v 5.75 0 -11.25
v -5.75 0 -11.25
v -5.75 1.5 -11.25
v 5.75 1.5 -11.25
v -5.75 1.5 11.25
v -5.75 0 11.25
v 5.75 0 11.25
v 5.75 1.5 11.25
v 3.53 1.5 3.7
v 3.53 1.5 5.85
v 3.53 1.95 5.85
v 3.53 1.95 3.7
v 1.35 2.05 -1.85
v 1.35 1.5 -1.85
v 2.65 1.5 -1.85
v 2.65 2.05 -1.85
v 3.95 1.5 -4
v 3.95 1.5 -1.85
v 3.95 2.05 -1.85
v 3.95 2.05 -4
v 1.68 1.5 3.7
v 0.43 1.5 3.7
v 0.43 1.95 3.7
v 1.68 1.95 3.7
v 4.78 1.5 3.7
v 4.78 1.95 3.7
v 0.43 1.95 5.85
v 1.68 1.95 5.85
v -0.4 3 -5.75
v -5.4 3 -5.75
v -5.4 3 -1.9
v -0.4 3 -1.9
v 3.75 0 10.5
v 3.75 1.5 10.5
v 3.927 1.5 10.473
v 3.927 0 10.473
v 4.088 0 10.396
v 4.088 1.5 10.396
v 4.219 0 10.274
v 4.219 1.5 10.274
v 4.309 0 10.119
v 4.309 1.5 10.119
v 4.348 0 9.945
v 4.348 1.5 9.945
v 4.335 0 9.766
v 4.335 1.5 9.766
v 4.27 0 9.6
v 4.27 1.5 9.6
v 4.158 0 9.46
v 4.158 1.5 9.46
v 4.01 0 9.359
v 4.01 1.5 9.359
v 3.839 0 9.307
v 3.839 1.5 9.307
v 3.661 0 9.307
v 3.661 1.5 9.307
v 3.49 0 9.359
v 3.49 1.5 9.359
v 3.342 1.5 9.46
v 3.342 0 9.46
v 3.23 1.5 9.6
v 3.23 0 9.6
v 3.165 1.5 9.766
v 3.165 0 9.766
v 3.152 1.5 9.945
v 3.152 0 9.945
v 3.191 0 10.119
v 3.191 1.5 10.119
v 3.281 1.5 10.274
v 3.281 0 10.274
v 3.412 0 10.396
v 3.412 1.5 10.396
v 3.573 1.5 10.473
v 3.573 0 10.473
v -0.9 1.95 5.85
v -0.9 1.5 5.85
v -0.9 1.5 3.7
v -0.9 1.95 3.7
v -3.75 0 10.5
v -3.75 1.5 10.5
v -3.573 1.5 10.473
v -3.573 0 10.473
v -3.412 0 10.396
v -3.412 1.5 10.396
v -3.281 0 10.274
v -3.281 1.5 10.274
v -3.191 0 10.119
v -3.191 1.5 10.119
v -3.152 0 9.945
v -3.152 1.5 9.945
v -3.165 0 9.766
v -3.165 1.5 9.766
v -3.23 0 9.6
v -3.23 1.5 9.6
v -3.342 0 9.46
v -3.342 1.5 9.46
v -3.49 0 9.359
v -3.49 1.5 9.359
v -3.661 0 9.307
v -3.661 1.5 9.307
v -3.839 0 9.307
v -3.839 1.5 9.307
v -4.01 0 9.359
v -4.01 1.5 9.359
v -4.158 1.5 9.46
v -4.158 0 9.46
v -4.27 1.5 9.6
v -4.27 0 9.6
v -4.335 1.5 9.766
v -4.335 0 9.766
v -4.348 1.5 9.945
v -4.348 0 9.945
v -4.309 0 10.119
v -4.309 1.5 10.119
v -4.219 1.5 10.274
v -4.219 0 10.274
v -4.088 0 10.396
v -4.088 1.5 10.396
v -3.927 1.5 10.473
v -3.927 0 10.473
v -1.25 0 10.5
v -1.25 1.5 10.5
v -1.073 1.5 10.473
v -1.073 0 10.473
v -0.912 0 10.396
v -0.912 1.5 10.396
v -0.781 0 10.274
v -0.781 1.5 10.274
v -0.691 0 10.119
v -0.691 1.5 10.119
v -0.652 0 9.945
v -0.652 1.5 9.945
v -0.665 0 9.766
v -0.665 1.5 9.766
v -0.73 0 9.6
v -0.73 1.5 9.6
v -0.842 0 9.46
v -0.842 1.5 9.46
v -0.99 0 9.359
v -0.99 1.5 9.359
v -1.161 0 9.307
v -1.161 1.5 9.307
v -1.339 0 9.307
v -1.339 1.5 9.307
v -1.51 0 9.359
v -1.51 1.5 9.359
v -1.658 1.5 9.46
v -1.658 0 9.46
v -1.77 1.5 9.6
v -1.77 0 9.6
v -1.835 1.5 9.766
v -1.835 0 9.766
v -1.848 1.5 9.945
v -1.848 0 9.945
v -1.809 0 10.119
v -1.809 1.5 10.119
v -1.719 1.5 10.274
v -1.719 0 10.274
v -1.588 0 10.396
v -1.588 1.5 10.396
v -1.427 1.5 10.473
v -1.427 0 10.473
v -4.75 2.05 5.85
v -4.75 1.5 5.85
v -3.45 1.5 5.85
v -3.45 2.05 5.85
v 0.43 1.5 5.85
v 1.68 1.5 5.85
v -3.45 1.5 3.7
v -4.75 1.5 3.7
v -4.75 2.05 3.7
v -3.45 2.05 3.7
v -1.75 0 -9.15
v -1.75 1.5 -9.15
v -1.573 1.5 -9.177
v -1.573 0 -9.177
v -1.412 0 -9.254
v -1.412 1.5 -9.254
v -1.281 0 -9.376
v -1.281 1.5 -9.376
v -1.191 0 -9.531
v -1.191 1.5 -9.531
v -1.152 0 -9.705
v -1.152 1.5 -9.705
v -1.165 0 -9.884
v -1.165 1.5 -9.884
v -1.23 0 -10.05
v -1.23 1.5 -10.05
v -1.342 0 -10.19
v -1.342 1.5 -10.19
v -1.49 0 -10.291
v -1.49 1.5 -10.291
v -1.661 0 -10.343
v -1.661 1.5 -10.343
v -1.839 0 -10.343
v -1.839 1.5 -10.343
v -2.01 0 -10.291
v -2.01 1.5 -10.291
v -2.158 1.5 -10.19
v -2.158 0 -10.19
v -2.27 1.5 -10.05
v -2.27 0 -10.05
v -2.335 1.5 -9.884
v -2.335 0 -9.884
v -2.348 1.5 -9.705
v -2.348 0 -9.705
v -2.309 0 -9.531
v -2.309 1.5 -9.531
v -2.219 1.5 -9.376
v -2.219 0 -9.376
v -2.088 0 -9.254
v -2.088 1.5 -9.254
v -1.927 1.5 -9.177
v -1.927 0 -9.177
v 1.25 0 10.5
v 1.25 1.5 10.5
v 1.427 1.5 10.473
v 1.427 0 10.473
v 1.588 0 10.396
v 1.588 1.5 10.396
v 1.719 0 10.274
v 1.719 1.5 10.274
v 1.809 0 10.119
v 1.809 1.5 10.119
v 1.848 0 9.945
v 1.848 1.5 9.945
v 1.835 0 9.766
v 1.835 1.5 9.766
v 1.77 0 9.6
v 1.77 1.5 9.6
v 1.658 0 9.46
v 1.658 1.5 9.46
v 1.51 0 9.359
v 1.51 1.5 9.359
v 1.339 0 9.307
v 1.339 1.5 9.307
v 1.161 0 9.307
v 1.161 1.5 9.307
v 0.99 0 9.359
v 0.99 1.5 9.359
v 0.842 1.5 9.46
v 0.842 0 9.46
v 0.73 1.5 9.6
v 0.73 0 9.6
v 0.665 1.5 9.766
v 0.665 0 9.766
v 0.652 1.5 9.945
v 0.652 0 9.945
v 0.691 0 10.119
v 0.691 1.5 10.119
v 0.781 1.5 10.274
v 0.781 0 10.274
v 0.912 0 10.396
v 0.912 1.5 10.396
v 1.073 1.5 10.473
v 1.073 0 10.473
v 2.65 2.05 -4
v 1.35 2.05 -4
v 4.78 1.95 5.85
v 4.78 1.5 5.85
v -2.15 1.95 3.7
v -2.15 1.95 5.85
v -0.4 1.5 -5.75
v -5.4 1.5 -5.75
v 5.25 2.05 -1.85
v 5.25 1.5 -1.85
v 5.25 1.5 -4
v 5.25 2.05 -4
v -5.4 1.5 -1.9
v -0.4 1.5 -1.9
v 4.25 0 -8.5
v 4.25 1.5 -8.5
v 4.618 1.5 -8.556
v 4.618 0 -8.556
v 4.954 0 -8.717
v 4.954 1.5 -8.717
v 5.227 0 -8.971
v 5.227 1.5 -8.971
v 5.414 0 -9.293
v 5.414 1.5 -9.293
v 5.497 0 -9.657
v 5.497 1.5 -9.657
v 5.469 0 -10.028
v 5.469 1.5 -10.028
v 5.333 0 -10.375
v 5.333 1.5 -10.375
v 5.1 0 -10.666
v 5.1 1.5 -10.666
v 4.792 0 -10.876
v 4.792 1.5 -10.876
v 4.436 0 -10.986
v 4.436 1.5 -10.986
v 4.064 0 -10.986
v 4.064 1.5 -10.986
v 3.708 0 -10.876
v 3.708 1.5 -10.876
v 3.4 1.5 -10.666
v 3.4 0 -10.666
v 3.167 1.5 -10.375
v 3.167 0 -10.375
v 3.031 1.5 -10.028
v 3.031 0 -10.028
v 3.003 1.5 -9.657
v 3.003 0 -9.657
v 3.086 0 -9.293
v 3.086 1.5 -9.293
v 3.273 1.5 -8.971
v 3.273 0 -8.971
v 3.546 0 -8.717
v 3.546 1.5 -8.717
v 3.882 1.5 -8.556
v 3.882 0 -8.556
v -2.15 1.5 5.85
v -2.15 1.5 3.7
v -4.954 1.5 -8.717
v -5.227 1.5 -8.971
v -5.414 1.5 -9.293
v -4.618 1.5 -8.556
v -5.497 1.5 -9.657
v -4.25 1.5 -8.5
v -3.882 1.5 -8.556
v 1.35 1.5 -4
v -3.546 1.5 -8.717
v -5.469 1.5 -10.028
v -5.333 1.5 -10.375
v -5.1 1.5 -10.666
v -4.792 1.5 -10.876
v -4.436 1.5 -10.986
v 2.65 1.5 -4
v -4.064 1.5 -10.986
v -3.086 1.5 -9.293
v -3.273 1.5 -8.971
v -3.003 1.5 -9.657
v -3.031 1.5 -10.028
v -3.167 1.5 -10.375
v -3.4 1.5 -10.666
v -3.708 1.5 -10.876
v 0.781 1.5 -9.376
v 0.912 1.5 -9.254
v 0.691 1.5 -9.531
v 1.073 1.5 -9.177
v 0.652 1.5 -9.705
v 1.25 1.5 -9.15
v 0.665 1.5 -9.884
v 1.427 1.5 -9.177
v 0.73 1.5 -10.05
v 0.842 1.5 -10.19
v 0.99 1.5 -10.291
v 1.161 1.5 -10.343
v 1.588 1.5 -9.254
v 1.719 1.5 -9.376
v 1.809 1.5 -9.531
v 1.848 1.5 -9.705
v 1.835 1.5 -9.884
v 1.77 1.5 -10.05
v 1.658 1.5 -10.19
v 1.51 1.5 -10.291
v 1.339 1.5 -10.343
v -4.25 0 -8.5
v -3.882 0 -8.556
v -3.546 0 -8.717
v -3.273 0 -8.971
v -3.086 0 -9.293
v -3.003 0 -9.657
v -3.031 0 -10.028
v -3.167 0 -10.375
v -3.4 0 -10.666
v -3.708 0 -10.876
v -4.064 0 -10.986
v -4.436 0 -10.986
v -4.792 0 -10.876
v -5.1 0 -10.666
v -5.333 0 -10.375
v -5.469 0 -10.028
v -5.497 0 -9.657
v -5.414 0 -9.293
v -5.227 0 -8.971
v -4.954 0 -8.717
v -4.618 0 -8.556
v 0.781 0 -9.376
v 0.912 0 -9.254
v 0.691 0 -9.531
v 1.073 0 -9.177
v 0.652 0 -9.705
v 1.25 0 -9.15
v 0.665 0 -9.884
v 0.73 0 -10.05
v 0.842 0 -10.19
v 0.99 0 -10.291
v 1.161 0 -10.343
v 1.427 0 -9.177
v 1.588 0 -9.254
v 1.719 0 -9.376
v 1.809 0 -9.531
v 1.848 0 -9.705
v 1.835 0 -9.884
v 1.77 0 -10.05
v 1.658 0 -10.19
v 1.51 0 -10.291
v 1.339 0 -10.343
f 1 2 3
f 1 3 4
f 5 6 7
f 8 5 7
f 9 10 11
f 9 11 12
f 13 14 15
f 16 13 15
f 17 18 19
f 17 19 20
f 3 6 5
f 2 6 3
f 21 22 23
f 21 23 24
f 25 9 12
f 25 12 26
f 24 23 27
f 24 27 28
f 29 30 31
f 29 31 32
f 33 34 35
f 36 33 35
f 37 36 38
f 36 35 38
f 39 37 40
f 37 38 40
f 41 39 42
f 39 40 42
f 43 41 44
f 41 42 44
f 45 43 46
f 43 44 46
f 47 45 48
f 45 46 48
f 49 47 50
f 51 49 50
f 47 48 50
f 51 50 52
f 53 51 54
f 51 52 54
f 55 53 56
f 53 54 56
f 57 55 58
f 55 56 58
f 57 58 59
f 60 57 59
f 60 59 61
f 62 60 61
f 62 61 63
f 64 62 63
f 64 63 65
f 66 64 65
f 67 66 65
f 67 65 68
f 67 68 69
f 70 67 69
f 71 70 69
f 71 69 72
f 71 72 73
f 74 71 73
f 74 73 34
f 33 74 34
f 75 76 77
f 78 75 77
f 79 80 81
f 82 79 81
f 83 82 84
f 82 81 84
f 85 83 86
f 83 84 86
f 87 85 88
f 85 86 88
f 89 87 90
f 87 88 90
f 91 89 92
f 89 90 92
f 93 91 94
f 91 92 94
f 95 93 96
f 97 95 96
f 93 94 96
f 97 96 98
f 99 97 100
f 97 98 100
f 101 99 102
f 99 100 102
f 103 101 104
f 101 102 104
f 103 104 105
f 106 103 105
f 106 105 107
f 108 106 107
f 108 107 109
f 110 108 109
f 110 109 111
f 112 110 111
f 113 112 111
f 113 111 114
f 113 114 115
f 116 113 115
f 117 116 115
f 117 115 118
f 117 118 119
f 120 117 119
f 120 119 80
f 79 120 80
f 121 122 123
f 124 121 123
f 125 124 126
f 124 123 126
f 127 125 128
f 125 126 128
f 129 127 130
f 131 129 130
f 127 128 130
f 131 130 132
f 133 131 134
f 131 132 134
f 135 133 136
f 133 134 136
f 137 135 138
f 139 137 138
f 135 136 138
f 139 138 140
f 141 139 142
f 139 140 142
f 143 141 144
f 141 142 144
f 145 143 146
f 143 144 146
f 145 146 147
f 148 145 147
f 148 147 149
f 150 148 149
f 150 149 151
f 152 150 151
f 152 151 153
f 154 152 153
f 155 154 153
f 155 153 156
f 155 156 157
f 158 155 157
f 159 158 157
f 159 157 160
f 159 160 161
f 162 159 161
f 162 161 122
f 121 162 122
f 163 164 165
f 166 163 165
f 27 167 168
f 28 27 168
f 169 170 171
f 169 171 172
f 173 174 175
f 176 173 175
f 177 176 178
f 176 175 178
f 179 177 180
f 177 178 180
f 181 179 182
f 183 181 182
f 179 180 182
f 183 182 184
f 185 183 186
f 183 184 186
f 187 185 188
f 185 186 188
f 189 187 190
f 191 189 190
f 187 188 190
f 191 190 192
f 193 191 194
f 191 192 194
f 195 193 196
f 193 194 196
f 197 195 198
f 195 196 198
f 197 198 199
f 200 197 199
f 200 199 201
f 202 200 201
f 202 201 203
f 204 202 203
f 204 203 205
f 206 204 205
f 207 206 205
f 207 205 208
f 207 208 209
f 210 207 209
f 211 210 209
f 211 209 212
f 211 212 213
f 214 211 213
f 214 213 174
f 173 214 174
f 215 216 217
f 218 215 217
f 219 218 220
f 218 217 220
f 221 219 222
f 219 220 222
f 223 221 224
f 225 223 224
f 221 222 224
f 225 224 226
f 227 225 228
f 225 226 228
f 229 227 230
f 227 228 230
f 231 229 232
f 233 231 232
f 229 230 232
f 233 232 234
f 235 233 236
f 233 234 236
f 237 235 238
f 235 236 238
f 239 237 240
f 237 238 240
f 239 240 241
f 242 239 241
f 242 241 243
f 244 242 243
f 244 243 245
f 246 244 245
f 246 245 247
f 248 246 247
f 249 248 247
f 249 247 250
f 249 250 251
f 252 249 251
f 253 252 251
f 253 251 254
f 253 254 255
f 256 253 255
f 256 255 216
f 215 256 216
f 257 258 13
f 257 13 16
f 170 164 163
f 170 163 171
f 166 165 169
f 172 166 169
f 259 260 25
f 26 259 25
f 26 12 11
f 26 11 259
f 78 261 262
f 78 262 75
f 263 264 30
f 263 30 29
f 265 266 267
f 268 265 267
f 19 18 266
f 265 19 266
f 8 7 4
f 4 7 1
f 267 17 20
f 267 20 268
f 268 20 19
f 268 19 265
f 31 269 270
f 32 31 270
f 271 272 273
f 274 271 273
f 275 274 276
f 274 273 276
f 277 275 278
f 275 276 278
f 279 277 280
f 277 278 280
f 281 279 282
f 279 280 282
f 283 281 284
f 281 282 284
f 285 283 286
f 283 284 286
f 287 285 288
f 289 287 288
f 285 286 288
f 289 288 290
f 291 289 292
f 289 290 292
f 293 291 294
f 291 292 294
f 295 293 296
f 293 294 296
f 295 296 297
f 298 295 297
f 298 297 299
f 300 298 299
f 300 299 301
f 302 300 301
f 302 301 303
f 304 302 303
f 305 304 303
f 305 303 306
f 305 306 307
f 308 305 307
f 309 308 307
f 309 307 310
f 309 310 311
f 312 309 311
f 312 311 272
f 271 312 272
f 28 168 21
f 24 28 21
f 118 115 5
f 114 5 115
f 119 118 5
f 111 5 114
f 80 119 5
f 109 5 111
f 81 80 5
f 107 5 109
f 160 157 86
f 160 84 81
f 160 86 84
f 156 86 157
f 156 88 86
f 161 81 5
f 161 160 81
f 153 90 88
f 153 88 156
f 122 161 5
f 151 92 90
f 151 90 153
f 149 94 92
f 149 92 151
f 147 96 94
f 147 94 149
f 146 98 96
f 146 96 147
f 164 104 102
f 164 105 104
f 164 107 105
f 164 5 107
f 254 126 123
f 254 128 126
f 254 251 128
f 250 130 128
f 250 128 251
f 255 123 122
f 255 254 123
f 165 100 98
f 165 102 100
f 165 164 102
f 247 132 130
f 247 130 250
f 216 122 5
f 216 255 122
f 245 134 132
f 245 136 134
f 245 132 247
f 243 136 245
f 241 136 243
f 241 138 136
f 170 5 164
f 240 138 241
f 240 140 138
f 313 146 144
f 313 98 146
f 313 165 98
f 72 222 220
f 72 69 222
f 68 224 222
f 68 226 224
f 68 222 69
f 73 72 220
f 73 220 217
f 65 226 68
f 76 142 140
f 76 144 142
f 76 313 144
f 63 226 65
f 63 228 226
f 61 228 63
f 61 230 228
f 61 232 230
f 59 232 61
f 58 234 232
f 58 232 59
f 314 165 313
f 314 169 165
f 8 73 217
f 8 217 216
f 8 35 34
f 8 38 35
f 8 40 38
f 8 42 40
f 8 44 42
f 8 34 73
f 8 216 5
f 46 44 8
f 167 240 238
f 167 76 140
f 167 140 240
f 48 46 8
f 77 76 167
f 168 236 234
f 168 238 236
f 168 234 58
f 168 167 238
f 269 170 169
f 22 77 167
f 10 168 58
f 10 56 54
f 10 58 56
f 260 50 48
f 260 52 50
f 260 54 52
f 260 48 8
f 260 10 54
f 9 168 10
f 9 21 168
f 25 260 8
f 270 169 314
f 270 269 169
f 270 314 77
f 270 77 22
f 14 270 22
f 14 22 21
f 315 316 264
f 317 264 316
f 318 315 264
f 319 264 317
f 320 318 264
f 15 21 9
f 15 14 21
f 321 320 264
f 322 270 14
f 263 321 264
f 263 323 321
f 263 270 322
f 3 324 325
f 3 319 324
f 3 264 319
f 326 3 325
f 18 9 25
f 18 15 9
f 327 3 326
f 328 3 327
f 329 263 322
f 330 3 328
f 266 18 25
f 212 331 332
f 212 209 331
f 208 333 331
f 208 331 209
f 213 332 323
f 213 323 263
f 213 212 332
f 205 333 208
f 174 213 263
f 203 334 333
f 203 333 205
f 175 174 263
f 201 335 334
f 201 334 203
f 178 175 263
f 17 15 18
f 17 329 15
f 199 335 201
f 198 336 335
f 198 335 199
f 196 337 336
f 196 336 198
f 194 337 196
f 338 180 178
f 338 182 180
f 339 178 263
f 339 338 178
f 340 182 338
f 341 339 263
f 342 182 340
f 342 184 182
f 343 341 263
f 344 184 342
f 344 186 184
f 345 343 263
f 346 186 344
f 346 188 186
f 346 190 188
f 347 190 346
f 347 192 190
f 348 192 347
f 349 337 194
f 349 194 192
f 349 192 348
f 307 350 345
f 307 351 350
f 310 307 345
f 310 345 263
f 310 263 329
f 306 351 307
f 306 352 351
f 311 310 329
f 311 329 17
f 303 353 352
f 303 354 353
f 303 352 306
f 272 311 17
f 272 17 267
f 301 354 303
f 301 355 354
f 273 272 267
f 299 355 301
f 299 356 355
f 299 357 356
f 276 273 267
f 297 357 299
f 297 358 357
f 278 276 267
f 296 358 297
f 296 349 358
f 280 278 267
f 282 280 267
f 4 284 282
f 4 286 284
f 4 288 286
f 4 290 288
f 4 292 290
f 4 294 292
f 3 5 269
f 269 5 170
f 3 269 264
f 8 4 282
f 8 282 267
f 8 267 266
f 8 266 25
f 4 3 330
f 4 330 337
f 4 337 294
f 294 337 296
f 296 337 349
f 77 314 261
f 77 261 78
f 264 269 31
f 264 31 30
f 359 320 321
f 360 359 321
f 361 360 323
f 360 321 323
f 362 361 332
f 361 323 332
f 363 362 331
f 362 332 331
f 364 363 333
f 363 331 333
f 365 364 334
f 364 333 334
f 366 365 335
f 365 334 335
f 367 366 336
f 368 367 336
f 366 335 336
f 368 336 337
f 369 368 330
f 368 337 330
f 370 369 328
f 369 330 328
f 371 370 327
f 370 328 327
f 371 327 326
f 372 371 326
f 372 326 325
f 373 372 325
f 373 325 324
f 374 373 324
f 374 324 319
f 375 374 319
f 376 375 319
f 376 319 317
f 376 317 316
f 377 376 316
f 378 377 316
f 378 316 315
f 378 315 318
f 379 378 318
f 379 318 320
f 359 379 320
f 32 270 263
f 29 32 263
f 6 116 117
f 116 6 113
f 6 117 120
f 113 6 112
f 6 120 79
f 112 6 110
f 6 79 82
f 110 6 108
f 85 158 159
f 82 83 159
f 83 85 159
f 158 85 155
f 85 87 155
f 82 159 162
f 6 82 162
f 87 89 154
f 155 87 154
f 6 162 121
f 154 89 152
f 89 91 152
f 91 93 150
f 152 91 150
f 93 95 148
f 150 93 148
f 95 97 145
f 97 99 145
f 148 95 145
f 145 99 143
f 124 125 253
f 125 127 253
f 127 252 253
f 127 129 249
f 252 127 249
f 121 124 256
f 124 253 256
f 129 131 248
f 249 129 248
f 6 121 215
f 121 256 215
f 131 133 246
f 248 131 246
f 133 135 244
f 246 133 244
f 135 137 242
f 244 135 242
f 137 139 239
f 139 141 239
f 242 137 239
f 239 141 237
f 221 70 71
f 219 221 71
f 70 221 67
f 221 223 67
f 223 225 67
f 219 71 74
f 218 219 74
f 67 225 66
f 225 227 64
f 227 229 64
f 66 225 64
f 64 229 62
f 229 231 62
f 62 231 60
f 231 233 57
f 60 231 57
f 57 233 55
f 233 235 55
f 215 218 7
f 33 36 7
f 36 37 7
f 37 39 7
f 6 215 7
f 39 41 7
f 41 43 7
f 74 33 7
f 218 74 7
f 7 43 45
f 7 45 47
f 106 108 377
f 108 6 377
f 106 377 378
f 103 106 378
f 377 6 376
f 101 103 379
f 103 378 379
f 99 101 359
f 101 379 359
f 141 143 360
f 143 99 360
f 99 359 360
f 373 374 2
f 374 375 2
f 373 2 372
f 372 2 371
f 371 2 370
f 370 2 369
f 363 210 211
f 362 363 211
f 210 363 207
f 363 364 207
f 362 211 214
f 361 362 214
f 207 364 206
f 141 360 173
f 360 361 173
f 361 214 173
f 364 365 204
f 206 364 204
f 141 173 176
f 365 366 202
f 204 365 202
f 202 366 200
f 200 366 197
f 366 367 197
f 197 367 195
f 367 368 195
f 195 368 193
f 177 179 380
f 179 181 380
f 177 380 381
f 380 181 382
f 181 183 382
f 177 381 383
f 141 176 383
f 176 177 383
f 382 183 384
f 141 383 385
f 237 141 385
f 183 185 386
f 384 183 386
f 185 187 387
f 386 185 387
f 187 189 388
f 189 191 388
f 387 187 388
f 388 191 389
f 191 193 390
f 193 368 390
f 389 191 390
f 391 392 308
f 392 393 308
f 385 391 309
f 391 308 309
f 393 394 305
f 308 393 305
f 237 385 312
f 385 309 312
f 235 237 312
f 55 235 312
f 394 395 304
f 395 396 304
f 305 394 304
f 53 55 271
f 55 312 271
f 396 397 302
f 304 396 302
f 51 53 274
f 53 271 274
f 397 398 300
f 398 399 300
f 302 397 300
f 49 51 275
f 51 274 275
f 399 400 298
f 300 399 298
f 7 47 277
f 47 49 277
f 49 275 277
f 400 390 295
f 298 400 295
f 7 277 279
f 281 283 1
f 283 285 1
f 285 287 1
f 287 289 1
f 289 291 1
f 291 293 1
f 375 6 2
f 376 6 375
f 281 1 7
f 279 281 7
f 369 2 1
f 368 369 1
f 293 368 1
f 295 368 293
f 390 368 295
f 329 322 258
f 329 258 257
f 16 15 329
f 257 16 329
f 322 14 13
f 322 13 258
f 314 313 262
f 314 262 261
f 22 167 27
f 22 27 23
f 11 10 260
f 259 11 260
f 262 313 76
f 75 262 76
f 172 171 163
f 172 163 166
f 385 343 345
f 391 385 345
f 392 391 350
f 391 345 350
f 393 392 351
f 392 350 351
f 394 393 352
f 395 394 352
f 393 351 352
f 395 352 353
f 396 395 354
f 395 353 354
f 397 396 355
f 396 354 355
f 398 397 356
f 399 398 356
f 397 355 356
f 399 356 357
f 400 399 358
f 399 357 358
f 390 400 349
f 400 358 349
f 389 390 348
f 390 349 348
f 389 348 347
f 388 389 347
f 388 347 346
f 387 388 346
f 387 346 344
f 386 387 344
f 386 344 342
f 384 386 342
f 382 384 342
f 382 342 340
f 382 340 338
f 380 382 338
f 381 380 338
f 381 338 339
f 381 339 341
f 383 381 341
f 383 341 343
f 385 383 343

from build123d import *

# Parameters (mm, degrees)
SKETCH1_W                   = 11.5
SKETCH1_H                   = 22.5
PCB_DEPTH                   = 1.5
SKETCH2_4_R                 = 0.6
INITIAL_INPUT_HOLES_DEPTH   = 13.72301065
INPUT_HOLES_LPATTERN_COUNT  = 4
INPUT_HOLES_LPATTERN_PITCH  = 2.5
SKETCH2_3_R                 = 0.6
INITIAL_OUTPUT_HOLE_DEPTH   = 13.72301065
OUTPUT_HOLES_LPATTERN_COUNT = 2
OUTPUT_HOLES_LPATTERN_PITCH = 3
SKETCH2_R                   = 1.25
MOUNTING_HOLES_DEPTH        = 13.72301065
SKETCH3_4_W                 = 1.3
SKETCH3_4_H                 = 2.15
CAPACITORS_DEPTH            = 0.55
SKETCH3_3_W                 = 1.25
SKETCH3_3_H                 = 2.15
RESISTORS_DEPTH             = 0.45
SKETCH3_W                   = 5
SKETCH3_H                   = 3.85
TRANSCEIVER_CHIP_DEPTH      = 1.5


with BuildPart() as part:
    # Sketch1 → PCB (new body)
    with BuildSketch(Plane(origin=(0, 0, 0), x_dir=(1, 0, 0), z_dir=(0, 1, 0))):
        Rectangle(SKETCH1_W, SKETCH1_H)
    extrude(amount=PCB_DEPTH)

    # Sketch2<4> → Initial Input Holes (cut, through all)
    with BuildSketch(Plane(origin=(0, 1.5, 0), x_dir=(1, 0, 0), z_dir=(0, 1, 0))):
        with Locations((-3.75, -9.9)):
            Circle(SKETCH2_4_R)
    initial_input_holes = extrude(amount=-INITIAL_INPUT_HOLES_DEPTH, mode=Mode.SUBTRACT)

    # Input Holes LPattern: Initial Input Holes ×4
    with Locations(*[(i * INPUT_HOLES_LPATTERN_PITCH, 0, 0) for i in range(1, INPUT_HOLES_LPATTERN_COUNT)]):
        add(initial_input_holes, mode=Mode.SUBTRACT)

    # Sketch2<3> → Initial Output Hole (cut, through all)
    with BuildSketch(Plane(origin=(0, 1.5, 0), x_dir=(1, 0, 0), z_dir=(0, 1, 0))):
        with Locations((-1.75, 9.75)):
            Circle(SKETCH2_3_R)
    initial_output_hole = extrude(amount=-INITIAL_OUTPUT_HOLE_DEPTH, mode=Mode.SUBTRACT)

    # Output Holes LPattern: Initial Output Hole ×2
    with Locations(*[(i * OUTPUT_HOLES_LPATTERN_PITCH, 0, 0) for i in range(1, OUTPUT_HOLES_LPATTERN_COUNT)]):
        add(initial_output_hole, mode=Mode.SUBTRACT)

    # Sketch2 → Mounting Holes (cut, through all)
    with BuildSketch(Plane(origin=(0, 1.5, 0), x_dir=(1, 0, 0), z_dir=(0, 1, 0))):
        with Locations((-4.25, 9.75)):
            Circle(SKETCH2_R)
        with Locations((4.25, 9.75)):
            Circle(SKETCH2_R)
    extrude(amount=-MOUNTING_HOLES_DEPTH, mode=Mode.SUBTRACT)

    # Sketch3<4> → Capacitors (add)
    with BuildSketch(Plane(origin=(0, 1.5, 0), x_dir=(1, 0, 0), z_dir=(0, 1, 0))):
        with Locations((2, 2.925)):
            Rectangle(SKETCH3_4_W, SKETCH3_4_H)
        with Locations((4.6, 2.925)):
            Rectangle(SKETCH3_4_W, SKETCH3_4_H)
        with Locations((-4.1, -4.775)):
            Rectangle(SKETCH3_4_W, SKETCH3_4_H)
    extrude(amount=CAPACITORS_DEPTH)

    # Sketch3<3> → Resistors (add)
    with BuildSketch(Plane(origin=(0, 1.5, 0), x_dir=(1, 0, 0), z_dir=(0, 1, 0))):
        with Locations((4.155, -4.775)):
            Rectangle(SKETCH3_3_W, SKETCH3_3_H)
        with Locations((1.055, -4.775)):
            Rectangle(SKETCH3_3_W, SKETCH3_3_H)
        with Locations((-1.525, -4.775)):
            Rectangle(SKETCH3_3_W, SKETCH3_3_H)
    extrude(amount=RESISTORS_DEPTH)

    # Sketch3 → Transceiver Chip (add)
    with BuildSketch(Plane(origin=(0, 1.5, 0), x_dir=(1, 0, 0), z_dir=(0, 1, 0))):
        with Locations((-2.9, 3.825)):
            Rectangle(SKETCH3_W, SKETCH3_H)
    extrude(amount=TRANSCEIVER_CHIP_DEPTH)


solid = part.part
